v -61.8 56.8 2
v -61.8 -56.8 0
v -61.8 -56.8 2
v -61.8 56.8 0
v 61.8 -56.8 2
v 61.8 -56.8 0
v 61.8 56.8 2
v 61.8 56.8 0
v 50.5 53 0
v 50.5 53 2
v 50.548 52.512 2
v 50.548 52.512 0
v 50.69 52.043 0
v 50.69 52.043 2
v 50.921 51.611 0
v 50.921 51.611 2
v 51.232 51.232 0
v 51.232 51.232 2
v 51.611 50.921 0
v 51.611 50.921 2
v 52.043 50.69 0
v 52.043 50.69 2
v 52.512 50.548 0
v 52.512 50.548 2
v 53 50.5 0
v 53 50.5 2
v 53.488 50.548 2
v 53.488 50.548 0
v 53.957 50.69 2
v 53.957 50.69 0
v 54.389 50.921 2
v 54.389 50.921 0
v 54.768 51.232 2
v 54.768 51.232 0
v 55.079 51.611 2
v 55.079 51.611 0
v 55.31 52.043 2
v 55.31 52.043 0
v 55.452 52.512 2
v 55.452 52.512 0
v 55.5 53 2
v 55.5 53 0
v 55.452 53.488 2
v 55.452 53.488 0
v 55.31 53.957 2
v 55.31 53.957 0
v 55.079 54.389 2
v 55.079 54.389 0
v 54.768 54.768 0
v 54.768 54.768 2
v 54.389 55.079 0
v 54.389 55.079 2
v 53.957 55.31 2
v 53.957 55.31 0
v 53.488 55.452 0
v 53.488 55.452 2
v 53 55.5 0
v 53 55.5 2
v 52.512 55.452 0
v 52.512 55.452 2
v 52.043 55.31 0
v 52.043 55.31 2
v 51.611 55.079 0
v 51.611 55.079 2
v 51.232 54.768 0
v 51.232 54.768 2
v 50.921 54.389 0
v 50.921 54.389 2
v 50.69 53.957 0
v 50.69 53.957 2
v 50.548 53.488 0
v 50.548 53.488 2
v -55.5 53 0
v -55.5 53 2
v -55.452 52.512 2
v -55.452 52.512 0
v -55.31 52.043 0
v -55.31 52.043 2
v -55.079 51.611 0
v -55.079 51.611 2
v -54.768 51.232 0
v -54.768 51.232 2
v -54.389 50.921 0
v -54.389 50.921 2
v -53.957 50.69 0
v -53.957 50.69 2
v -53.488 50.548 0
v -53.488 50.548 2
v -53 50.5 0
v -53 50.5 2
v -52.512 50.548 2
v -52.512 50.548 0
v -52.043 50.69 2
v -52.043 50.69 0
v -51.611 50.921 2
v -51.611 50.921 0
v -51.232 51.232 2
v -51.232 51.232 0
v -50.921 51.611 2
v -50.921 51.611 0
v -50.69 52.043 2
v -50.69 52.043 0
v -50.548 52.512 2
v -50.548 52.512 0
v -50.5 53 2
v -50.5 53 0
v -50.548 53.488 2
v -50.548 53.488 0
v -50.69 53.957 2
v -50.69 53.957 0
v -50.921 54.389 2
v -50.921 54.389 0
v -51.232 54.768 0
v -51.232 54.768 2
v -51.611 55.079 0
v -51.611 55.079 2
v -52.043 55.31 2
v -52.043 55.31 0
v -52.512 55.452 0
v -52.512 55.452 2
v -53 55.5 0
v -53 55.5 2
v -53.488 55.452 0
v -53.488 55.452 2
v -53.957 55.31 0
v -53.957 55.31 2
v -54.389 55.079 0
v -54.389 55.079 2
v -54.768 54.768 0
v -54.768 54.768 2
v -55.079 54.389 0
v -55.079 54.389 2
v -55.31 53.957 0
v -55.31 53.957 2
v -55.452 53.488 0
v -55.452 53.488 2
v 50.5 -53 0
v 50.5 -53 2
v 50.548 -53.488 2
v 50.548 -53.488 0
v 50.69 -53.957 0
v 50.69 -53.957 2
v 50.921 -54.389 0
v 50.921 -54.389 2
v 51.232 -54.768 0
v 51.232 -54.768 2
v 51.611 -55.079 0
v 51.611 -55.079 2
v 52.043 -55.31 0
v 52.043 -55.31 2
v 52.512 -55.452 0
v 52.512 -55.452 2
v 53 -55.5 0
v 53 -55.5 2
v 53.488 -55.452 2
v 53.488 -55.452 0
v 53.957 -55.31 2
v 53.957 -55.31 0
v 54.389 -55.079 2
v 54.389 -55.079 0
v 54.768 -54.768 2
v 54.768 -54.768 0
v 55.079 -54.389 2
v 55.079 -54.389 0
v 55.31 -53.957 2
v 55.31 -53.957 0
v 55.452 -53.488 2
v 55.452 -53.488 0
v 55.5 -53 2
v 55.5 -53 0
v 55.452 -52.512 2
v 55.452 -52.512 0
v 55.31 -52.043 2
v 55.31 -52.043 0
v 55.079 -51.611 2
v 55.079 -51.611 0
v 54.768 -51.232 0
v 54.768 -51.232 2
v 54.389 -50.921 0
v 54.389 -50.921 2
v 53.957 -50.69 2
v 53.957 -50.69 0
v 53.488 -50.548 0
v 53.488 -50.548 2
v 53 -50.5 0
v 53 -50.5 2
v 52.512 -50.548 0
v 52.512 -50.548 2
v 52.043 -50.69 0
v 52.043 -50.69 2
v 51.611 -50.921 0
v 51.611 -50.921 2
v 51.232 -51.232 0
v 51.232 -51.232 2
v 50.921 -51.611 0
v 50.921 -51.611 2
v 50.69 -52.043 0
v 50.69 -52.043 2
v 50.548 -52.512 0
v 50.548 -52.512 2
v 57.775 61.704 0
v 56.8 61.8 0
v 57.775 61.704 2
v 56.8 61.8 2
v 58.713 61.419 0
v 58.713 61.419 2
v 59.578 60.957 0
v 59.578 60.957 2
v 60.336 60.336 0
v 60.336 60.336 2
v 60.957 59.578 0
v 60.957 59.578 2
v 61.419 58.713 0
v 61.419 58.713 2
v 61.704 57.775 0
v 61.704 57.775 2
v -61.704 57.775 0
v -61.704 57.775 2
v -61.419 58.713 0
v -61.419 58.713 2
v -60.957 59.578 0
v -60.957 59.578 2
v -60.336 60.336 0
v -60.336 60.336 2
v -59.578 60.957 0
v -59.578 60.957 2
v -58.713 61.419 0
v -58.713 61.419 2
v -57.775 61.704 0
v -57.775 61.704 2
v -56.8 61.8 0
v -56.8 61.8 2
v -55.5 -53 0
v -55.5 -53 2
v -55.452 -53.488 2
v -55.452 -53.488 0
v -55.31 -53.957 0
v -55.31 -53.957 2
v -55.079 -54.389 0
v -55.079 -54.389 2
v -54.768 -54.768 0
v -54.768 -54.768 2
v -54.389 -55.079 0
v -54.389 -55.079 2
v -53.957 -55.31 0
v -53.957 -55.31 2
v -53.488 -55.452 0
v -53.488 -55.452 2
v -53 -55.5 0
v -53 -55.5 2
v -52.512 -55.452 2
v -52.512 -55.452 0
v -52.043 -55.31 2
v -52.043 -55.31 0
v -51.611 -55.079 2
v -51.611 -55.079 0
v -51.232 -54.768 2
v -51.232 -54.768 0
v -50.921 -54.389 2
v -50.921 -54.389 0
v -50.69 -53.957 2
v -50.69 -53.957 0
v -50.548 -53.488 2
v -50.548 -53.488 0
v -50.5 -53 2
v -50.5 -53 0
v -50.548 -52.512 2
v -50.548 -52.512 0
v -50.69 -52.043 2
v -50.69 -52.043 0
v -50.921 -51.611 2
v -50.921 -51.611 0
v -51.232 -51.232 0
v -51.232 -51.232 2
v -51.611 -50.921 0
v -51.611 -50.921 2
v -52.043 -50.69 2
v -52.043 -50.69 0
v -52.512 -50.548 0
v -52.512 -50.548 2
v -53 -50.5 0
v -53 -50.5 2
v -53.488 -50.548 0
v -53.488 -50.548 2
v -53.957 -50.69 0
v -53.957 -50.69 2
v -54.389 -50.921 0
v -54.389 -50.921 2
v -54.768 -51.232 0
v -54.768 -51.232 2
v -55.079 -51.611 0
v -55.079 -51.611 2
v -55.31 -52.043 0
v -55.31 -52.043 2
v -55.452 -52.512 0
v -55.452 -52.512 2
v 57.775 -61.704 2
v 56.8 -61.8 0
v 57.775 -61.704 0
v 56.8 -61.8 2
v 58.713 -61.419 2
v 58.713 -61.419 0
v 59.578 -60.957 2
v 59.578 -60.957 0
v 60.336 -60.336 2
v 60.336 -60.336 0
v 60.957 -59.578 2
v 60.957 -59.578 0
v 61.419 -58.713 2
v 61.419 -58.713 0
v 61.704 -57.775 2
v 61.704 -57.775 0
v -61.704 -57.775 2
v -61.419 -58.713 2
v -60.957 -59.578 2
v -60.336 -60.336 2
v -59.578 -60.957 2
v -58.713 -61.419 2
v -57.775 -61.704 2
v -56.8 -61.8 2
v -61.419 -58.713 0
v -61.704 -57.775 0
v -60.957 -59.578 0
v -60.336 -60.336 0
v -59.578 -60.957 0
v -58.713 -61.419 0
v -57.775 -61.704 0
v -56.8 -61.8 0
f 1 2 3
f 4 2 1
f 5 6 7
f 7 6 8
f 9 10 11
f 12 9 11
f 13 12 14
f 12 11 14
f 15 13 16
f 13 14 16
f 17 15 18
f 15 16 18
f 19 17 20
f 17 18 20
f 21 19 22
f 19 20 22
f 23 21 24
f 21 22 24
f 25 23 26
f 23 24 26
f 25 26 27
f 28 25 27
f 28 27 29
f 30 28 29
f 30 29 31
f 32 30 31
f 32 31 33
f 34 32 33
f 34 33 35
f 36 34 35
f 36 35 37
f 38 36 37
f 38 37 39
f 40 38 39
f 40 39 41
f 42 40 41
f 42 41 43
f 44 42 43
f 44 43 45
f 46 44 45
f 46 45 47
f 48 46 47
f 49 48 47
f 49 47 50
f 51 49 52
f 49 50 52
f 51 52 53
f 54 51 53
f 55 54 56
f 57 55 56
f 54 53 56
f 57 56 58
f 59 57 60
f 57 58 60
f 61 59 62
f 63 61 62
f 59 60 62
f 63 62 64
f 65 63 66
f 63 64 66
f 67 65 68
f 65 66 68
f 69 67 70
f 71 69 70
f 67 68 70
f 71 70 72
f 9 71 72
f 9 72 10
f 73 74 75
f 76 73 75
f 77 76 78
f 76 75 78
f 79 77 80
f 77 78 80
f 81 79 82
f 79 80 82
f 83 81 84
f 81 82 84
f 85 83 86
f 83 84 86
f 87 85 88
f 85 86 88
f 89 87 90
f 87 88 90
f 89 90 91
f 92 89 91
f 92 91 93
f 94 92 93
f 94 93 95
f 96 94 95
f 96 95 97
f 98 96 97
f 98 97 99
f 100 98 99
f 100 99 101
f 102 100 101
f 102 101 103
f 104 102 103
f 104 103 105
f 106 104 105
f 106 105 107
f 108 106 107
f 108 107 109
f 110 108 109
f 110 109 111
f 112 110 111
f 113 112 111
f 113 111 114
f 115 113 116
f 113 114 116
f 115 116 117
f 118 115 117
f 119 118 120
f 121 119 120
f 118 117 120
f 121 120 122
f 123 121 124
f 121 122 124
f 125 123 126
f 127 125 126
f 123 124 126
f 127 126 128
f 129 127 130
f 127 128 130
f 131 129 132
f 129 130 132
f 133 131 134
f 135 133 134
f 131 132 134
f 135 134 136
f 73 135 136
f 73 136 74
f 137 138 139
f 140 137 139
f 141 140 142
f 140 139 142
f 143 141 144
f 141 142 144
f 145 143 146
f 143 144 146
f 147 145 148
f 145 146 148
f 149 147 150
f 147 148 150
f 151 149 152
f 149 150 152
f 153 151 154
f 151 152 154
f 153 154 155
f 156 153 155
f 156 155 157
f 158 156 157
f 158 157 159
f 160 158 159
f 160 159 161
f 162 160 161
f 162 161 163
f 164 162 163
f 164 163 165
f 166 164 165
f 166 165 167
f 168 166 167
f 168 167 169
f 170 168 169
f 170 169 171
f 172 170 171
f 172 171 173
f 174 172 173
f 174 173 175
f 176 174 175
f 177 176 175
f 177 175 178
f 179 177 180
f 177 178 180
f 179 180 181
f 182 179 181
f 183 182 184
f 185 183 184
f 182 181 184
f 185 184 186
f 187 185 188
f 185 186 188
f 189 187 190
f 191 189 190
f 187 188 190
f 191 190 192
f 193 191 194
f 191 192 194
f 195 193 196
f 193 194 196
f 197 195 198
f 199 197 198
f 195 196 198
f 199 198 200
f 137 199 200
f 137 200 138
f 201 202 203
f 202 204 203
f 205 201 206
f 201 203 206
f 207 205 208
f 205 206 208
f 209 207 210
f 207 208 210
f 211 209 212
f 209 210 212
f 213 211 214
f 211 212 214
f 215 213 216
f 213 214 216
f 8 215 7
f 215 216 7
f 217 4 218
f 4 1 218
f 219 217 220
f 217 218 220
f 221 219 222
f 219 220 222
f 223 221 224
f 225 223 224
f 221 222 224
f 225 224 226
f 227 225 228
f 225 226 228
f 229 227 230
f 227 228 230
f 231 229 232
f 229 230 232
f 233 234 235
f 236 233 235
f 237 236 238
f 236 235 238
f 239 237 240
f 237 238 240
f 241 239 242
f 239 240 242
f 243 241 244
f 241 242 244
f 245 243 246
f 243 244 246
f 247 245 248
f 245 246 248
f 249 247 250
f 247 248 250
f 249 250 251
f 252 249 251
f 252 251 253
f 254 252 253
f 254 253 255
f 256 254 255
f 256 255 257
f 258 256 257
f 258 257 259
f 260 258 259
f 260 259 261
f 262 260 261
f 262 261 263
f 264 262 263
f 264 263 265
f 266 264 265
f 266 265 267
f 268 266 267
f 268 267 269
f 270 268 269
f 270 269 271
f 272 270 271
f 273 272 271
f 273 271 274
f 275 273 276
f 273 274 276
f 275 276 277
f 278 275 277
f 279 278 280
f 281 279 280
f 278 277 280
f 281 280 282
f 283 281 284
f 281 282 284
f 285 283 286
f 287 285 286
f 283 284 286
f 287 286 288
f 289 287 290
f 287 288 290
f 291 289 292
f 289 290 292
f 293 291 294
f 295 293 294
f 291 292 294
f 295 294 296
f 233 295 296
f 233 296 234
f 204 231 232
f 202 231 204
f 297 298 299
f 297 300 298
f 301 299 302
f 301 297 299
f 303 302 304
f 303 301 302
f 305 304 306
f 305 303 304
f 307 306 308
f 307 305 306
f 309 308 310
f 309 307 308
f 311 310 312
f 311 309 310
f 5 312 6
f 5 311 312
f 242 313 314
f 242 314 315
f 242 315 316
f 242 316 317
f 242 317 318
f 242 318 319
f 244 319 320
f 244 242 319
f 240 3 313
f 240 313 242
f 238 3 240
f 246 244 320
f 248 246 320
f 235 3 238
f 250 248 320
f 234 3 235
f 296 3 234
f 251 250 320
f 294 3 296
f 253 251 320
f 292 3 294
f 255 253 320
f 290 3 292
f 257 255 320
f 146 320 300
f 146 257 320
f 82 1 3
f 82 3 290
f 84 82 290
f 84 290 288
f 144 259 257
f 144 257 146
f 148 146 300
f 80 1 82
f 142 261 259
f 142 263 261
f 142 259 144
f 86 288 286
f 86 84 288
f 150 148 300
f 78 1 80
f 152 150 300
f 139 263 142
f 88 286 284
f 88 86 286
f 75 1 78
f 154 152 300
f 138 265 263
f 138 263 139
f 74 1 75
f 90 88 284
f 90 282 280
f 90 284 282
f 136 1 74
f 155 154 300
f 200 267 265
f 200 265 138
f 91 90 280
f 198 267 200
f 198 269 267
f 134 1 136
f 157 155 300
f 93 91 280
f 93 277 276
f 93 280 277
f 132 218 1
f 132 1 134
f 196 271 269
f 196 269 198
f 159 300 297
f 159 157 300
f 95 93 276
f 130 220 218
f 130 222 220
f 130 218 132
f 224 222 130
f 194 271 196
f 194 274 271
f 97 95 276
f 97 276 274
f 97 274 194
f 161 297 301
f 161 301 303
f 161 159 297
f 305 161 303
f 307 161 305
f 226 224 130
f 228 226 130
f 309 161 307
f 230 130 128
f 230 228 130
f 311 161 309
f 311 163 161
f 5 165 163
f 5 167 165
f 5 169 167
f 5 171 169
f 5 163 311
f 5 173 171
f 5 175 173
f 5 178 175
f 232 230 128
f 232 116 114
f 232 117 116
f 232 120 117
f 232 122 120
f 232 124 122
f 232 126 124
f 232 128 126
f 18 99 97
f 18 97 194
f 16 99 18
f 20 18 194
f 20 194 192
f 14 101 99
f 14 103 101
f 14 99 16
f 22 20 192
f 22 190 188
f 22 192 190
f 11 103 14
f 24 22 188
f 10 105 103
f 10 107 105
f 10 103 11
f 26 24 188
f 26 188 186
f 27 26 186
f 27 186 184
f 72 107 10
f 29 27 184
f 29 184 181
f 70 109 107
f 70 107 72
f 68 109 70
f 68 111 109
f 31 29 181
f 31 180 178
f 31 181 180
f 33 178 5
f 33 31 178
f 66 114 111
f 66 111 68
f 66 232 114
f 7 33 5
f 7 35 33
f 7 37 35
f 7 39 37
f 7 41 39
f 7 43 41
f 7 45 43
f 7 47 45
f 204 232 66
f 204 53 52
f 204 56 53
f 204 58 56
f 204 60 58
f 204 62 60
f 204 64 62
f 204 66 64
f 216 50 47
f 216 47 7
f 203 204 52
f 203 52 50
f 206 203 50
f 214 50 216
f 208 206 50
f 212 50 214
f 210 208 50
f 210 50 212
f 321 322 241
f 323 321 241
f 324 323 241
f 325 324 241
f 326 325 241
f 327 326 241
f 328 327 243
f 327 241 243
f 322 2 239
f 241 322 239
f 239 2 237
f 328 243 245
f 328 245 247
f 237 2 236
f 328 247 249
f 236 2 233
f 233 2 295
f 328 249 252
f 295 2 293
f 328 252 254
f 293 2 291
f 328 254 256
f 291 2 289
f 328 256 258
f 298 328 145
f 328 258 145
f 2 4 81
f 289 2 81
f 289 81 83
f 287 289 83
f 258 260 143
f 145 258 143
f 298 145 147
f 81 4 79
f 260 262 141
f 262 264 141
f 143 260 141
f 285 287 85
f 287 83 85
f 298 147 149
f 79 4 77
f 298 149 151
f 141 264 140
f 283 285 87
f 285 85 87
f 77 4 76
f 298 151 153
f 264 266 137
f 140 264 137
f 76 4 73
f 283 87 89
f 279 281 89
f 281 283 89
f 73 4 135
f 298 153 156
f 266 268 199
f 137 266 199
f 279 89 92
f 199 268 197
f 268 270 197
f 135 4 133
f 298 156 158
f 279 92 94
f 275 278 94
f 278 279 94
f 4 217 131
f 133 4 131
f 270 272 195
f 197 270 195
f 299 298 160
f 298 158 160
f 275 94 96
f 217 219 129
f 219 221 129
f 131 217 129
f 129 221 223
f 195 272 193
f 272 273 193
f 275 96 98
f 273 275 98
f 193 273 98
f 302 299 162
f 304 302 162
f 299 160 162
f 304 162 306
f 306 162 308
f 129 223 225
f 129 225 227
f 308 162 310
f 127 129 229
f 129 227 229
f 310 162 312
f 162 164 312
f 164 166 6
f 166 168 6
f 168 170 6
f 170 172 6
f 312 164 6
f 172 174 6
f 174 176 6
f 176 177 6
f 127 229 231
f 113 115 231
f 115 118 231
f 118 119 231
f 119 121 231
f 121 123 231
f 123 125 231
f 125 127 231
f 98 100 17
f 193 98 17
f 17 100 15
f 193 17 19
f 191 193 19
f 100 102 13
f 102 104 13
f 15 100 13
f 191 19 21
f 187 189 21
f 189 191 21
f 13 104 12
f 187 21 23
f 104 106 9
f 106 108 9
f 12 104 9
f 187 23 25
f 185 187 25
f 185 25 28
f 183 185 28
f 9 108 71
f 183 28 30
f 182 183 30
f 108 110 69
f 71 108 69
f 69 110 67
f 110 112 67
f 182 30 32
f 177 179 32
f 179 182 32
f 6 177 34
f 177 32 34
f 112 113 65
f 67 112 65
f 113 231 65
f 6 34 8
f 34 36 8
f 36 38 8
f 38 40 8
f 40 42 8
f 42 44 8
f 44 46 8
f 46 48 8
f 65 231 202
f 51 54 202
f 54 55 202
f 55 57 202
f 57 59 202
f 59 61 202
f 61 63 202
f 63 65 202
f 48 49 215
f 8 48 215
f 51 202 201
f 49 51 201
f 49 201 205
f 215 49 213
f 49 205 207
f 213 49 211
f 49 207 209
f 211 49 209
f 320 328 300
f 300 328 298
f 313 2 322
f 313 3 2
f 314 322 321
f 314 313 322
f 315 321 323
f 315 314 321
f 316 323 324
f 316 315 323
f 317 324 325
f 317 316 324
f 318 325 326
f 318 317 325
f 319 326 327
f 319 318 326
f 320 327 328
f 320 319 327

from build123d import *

# Parameters (mm, degrees)
F0_W     = 123.6
F0_H     = 123.6
F1_DEPTH = 2
F2_D     = 5
F2_DEPTH = 4
F3_R     = 5


with BuildPart() as f1:
    # F0 (on Top) → F1 (new body)
    with BuildSketch(Plane.XY):
        Rectangle(F0_W, F0_H)
    extrude(amount=F1_DEPTH)

    # F2
    with Locations(Plane(origin=(0, 0, 0), x_dir=(1, 0, 0), z_dir=(0, 0, -1))):
        with Locations((-53, 53), (53, 53), (-53, -53), (53, -53)):
            Hole(F2_D / 2, depth=F2_DEPTH)

    # F3
    f3_edges = [f1.edges().sort_by_distance(p)[0] for p in [
        (61.8, -61.8, 1),
        (-61.8, -61.8, 1),
        (-61.8, 61.8, 1),
        (61.8, 61.8, 1),
    ]]
    fillet(f3_edges, radius=F3_R)


solid = f1.part
